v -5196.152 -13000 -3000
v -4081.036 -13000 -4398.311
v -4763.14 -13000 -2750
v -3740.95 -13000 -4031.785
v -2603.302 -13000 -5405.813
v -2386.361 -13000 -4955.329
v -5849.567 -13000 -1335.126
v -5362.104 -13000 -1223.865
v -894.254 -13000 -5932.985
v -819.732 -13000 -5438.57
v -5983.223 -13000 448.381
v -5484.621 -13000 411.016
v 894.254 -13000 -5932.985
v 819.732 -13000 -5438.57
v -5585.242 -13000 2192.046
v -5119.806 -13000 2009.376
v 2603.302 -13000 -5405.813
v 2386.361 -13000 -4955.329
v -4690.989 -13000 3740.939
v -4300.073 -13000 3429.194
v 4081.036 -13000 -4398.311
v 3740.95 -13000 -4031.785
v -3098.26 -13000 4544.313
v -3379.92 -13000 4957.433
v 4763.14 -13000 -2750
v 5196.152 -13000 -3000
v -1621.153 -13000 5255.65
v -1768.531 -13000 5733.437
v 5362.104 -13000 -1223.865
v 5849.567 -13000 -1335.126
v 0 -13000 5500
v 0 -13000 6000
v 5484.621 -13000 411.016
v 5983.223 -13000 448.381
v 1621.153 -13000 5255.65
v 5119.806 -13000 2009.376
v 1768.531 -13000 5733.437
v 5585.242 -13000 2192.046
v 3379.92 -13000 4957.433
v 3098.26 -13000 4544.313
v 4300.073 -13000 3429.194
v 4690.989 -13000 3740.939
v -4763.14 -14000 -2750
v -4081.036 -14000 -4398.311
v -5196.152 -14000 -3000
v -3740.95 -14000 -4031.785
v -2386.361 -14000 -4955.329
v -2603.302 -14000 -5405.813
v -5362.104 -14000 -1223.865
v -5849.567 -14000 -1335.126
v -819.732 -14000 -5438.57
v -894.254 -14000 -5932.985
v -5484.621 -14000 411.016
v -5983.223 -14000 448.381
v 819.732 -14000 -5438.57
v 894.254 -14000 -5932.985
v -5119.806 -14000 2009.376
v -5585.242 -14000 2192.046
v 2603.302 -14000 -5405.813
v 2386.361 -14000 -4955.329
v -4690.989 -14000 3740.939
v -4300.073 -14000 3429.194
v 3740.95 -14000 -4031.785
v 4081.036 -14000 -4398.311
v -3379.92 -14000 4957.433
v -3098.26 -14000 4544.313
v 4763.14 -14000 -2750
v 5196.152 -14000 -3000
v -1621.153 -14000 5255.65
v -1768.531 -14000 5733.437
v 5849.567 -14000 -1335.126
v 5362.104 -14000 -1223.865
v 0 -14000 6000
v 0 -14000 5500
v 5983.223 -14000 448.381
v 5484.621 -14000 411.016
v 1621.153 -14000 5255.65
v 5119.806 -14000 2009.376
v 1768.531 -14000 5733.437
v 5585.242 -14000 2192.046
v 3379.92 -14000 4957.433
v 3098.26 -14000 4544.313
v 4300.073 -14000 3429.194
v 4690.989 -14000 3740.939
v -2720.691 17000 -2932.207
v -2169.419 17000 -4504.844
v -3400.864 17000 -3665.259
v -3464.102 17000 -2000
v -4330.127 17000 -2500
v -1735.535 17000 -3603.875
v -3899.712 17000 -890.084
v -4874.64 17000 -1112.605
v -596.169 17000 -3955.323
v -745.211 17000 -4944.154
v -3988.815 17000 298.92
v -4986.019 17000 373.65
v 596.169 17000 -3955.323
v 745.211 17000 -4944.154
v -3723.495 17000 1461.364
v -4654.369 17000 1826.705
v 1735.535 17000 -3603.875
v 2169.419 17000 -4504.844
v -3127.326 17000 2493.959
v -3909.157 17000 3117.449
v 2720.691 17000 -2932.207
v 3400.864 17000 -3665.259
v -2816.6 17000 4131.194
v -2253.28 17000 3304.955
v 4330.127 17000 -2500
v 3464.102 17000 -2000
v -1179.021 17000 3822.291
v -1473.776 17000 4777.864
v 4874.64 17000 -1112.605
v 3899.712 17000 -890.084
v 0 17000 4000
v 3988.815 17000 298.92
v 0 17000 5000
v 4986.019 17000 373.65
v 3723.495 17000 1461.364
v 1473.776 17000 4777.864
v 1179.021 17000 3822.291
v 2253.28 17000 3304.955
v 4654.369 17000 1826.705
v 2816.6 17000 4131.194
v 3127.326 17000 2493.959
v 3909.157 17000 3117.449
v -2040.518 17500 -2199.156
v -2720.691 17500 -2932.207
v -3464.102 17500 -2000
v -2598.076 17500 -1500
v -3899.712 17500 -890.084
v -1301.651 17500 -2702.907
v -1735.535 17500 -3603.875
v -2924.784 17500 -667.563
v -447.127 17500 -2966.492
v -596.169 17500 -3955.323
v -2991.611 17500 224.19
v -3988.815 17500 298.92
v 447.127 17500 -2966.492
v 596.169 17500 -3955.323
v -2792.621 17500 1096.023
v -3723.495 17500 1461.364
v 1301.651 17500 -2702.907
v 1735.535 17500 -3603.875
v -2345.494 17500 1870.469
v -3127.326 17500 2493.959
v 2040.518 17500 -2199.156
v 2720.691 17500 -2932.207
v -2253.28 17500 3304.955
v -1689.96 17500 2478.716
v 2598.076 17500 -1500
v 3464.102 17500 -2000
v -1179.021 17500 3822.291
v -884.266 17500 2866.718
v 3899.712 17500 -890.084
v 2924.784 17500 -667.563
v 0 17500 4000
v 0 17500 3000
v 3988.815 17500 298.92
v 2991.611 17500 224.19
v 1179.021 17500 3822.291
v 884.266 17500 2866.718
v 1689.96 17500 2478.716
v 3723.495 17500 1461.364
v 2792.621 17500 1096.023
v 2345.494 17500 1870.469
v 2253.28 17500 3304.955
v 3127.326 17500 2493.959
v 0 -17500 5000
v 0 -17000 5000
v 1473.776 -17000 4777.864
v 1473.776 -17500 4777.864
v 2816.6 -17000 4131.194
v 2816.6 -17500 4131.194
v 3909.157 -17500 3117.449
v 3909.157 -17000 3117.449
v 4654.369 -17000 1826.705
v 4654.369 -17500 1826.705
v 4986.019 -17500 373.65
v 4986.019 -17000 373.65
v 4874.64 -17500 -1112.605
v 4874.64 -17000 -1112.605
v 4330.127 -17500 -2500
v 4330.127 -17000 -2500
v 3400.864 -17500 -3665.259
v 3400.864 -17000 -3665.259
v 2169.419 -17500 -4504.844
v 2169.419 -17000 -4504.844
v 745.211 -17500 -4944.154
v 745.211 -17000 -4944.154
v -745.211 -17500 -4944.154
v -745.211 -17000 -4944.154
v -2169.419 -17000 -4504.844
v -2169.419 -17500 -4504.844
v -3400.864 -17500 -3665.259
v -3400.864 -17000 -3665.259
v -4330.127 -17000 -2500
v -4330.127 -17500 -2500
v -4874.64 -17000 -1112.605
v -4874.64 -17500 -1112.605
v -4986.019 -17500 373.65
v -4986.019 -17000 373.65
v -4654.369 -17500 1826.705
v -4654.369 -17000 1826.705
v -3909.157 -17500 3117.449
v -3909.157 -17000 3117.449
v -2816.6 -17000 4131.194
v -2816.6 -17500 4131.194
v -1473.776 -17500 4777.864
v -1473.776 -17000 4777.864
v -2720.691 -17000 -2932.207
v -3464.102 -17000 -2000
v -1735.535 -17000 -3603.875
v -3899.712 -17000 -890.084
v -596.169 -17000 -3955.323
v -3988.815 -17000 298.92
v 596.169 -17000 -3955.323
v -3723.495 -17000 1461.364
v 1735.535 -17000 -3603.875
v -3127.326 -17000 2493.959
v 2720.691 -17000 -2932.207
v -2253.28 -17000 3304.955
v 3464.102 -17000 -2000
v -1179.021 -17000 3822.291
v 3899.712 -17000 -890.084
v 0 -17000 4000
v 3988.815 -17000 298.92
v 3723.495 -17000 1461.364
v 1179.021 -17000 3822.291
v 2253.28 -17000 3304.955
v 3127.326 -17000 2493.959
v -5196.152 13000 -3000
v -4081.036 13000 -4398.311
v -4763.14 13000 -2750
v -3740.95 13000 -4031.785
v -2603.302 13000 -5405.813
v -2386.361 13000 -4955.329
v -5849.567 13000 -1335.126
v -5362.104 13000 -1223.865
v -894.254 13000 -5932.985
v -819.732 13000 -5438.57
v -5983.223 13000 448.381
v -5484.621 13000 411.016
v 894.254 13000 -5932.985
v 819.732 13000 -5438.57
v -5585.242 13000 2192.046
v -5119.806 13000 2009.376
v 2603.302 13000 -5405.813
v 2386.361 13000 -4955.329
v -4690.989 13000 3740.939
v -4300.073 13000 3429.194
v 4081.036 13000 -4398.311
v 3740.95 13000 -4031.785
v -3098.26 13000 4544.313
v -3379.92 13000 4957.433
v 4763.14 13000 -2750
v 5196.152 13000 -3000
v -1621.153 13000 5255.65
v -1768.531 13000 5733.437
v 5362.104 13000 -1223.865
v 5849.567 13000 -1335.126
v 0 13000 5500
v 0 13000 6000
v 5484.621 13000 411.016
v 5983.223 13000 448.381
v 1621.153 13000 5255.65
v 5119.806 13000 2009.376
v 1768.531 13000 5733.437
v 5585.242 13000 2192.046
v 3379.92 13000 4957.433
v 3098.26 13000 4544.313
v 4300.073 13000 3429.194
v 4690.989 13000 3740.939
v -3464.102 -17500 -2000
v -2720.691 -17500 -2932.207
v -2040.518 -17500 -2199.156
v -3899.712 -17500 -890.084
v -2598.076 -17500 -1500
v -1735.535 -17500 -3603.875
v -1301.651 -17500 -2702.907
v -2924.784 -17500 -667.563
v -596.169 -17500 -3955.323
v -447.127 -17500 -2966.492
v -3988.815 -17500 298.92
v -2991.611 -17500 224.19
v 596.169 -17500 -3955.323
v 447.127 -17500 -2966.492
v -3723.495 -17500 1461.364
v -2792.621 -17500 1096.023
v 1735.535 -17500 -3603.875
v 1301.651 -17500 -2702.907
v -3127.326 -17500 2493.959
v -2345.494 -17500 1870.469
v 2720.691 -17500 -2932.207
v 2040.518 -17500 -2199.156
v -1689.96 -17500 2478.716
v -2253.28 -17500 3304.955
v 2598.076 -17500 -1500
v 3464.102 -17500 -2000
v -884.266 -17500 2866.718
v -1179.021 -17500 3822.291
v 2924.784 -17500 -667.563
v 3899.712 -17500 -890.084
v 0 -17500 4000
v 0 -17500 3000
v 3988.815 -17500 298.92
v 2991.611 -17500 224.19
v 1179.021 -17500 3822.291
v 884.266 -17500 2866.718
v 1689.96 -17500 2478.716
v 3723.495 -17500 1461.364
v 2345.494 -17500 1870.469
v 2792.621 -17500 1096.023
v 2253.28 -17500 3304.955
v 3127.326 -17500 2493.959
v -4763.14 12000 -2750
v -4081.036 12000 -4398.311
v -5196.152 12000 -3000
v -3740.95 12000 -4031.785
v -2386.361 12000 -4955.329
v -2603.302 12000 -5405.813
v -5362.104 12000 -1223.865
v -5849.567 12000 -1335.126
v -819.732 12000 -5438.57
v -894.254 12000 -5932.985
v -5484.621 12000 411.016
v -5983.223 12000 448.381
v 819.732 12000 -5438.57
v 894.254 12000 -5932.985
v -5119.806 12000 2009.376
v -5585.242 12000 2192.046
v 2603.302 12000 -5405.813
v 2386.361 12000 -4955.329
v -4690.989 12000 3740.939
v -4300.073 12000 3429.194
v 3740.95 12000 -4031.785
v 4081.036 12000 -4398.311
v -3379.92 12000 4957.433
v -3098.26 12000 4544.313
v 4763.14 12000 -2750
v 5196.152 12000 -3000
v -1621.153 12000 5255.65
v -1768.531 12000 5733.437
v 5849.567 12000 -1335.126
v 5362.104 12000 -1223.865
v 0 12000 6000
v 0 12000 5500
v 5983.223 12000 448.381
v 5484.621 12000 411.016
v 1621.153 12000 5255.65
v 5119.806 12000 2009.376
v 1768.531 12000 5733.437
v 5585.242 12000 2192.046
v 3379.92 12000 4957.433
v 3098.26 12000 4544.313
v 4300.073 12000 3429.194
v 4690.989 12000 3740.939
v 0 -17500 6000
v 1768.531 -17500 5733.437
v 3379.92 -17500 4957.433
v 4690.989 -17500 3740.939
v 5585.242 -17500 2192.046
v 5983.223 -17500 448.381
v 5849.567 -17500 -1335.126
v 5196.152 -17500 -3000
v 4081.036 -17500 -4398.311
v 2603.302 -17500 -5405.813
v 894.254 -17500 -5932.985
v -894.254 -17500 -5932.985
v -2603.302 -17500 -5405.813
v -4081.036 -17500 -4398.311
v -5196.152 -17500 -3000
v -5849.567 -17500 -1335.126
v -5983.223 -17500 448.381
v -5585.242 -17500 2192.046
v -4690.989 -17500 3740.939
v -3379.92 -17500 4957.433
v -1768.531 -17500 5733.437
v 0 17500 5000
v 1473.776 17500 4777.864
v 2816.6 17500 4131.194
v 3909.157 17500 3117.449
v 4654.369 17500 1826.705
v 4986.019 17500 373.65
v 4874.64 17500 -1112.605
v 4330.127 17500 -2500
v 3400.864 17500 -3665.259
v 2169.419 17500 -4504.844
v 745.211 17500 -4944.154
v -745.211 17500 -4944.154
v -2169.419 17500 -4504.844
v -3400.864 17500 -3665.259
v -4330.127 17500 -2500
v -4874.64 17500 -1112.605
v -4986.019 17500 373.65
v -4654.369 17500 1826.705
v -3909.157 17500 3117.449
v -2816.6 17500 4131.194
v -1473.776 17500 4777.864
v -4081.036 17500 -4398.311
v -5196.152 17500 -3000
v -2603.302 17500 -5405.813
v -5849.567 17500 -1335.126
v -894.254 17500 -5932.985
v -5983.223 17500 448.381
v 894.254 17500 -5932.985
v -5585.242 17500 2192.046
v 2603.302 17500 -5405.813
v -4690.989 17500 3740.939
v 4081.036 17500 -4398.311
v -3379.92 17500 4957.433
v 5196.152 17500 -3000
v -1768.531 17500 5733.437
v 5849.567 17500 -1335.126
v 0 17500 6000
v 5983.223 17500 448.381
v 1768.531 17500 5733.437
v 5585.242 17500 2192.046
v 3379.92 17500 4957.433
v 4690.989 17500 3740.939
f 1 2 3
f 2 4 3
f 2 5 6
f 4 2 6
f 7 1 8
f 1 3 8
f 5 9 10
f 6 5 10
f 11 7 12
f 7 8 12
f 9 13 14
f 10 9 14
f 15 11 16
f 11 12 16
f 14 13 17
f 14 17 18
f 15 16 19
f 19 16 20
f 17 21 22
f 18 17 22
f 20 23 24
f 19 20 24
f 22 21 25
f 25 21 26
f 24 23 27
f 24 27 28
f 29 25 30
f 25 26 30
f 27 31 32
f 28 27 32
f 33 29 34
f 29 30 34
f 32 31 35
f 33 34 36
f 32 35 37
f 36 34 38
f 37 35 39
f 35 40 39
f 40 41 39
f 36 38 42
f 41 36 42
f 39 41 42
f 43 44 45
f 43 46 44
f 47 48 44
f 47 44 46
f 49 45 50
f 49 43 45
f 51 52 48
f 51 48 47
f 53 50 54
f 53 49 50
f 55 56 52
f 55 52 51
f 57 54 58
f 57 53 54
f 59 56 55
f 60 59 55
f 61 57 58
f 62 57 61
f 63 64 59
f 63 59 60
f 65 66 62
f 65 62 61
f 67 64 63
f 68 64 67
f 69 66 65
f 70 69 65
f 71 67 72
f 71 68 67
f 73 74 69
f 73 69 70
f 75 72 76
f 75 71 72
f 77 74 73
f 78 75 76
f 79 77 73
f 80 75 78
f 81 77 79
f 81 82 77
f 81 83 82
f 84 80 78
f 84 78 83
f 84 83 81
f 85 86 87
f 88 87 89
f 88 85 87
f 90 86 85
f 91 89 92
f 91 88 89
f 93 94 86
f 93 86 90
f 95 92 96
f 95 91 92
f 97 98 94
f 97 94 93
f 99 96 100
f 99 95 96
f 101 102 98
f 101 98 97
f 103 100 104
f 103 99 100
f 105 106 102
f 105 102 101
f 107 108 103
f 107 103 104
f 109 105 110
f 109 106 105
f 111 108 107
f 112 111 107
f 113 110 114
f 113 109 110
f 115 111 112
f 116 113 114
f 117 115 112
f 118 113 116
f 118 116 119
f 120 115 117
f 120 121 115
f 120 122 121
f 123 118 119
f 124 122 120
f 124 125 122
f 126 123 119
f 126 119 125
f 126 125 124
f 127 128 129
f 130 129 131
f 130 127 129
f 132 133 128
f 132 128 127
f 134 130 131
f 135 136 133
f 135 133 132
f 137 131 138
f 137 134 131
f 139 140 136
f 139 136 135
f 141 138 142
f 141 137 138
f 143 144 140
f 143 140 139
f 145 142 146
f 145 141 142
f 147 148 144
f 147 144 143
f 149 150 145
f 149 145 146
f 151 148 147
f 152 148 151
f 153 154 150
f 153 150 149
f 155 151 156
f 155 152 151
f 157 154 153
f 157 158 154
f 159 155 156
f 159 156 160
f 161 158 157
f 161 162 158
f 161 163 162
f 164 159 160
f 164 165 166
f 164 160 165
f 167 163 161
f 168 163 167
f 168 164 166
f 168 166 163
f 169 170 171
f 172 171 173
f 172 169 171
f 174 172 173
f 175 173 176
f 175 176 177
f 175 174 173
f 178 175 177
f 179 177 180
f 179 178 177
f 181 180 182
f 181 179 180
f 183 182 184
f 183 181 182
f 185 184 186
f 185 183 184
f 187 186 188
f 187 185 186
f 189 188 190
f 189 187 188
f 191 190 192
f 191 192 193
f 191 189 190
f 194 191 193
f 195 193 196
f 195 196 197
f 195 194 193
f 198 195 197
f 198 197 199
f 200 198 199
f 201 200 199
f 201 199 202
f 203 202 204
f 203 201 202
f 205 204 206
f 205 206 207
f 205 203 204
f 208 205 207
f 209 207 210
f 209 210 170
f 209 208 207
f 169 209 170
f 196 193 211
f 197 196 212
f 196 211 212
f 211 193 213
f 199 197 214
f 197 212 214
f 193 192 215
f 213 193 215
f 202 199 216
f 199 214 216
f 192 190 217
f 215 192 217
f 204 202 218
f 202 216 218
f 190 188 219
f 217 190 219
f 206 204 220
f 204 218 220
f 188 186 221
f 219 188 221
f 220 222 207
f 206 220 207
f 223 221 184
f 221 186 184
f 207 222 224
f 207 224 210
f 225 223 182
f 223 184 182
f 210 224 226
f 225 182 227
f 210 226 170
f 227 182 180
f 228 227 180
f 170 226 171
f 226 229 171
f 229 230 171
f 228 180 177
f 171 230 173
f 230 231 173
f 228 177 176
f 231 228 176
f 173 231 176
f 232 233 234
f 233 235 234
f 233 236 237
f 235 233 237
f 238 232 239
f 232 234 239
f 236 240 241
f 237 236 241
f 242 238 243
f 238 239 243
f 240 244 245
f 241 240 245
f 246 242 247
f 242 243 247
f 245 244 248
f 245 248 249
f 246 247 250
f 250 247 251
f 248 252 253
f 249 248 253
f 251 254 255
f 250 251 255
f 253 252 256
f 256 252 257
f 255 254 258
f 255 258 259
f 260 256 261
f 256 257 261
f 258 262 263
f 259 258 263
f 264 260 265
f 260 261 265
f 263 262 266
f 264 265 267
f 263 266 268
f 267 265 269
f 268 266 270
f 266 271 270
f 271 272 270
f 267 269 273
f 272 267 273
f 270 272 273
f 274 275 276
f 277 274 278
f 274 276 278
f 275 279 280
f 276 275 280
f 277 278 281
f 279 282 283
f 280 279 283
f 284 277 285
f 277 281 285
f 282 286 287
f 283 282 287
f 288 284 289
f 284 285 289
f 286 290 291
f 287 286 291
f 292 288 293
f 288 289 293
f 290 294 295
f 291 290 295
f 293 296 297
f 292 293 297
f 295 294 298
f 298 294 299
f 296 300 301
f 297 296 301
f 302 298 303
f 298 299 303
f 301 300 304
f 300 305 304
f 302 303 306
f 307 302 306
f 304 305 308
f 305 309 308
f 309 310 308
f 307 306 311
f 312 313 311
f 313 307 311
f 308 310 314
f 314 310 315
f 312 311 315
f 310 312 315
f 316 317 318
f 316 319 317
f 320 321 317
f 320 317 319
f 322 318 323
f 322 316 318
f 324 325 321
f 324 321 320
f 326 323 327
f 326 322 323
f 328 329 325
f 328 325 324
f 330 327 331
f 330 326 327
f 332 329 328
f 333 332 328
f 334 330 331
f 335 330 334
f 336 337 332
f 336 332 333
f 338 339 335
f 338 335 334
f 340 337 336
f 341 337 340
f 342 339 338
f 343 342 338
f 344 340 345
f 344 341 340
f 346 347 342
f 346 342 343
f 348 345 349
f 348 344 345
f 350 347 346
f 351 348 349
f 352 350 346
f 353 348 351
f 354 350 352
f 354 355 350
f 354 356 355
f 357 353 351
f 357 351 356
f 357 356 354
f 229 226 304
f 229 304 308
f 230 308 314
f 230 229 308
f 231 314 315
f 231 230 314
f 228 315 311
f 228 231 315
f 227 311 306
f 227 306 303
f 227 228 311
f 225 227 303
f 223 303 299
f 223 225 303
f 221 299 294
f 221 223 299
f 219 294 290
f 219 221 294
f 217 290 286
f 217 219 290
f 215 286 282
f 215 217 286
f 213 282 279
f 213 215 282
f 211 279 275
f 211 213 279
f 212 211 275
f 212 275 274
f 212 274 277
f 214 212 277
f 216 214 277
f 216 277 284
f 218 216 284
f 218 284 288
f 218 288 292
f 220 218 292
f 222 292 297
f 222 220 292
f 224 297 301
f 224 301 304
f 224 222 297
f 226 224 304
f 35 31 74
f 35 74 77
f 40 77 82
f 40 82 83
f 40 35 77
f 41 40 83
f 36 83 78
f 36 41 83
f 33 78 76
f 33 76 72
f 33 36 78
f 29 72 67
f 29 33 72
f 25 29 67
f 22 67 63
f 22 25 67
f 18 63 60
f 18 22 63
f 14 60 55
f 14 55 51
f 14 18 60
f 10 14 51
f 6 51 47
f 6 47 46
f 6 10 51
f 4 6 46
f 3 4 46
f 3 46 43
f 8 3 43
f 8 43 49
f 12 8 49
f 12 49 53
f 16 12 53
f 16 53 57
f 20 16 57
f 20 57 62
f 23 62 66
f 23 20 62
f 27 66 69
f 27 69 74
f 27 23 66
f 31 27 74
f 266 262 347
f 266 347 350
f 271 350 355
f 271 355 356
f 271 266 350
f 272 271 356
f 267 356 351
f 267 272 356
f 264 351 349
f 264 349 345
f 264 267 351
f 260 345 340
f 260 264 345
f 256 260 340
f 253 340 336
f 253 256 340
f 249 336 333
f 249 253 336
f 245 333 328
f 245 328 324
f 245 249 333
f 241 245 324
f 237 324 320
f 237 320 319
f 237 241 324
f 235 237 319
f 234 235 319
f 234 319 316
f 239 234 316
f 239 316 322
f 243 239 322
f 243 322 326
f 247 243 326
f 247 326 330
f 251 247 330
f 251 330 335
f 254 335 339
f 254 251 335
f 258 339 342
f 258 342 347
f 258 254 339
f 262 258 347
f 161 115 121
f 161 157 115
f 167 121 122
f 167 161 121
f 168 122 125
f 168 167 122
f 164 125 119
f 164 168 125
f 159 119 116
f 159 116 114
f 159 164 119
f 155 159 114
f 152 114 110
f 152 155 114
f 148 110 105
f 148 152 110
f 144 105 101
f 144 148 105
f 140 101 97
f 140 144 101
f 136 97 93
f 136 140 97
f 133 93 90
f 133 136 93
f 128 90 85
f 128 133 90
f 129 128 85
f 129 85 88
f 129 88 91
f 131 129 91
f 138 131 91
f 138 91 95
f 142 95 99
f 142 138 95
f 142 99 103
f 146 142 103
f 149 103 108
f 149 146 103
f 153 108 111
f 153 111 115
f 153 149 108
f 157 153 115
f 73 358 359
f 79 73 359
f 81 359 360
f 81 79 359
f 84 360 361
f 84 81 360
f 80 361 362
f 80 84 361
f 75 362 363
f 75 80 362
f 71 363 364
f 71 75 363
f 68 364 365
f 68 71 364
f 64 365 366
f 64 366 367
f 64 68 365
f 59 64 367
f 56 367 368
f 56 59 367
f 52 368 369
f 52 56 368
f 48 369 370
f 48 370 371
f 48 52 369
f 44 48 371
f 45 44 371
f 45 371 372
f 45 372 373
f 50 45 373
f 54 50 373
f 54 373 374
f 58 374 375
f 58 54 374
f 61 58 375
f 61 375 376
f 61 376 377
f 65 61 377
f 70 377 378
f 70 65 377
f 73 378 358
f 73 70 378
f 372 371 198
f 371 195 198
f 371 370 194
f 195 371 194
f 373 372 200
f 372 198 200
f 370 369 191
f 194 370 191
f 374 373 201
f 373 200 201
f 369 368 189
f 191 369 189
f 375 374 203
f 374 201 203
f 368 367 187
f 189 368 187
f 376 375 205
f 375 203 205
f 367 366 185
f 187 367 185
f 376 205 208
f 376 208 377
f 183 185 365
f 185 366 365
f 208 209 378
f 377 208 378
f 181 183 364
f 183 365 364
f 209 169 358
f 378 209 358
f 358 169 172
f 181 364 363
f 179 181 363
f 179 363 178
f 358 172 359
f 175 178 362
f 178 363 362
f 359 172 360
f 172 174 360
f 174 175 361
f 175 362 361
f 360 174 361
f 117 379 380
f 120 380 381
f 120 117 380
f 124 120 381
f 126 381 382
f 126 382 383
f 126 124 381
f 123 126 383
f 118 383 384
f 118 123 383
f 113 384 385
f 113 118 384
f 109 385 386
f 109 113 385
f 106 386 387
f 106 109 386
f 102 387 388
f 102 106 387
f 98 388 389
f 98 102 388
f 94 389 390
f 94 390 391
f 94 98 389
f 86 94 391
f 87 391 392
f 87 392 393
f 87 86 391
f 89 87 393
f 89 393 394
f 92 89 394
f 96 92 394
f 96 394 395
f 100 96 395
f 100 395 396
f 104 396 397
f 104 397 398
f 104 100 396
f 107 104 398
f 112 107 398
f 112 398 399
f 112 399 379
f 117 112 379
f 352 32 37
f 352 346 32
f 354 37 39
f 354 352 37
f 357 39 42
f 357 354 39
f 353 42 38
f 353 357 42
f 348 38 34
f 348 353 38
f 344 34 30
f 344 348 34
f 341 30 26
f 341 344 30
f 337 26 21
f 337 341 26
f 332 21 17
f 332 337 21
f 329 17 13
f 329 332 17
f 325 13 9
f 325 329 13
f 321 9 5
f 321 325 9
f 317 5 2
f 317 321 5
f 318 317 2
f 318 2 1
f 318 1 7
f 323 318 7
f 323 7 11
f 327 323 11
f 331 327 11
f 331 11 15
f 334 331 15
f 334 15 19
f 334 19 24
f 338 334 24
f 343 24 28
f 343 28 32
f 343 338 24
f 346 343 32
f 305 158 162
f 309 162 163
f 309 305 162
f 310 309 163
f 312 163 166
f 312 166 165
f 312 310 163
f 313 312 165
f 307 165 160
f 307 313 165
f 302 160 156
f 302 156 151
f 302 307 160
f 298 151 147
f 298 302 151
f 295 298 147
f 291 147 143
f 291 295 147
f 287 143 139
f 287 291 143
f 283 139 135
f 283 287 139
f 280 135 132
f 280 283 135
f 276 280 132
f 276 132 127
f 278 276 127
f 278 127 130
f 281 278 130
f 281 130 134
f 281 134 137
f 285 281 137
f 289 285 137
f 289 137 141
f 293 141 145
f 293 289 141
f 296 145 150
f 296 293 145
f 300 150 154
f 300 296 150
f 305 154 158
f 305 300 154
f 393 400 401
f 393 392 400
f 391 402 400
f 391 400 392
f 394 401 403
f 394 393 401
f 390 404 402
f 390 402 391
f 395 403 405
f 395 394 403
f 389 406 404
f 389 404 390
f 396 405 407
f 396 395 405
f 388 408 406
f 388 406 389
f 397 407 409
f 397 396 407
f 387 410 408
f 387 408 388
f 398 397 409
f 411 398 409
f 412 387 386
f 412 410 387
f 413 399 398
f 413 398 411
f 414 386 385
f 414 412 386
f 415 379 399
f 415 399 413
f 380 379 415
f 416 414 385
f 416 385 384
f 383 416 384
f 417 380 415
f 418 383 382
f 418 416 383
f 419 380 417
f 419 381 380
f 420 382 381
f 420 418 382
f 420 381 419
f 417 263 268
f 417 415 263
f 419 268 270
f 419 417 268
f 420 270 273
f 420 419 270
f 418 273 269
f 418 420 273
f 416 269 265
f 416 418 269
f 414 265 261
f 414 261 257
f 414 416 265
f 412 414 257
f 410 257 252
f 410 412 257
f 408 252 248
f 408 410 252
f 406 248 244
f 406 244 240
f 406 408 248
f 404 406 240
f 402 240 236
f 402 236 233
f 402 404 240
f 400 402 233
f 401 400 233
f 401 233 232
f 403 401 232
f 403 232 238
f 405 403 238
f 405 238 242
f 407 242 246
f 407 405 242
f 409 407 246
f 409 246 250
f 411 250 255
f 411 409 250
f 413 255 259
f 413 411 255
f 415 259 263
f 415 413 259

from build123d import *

# Parameters (mm, degrees)
SKETCH_1_R          = 6000
SKETCH_1_R_2        = 5000
EXTRUDE_1_DEPTH     = 17500
SKETCH_1_5_R        = 4000
SKETCH_1_5_R_2      = 3000
EXTRUDE_3_DEPTH     = 17500
SKETCH_1_6_R        = 5000
SKETCH_1_6_R_2      = 4000
EXTRUDE_4_DEPTH     = 17000
SKETCH_5_R          = 6000
SKETCH_5_R_2        = 5500
CUT_EXTRUDE_4_DEPTH = 1000
SKETCH_6_R          = 6000
SKETCH_6_R_2        = 5500
CUT_EXTRUDE_5_DEPTH = 1000


with BuildPart() as part:
    # 草圖1 → 填料-伸長1 (new, symmetric)
    with BuildSketch(Plane(origin=(0, 0, 0), x_dir=(1, 0, 0), z_dir=(0, 1, 0))):
        Circle(SKETCH_1_R)
        Circle(SKETCH_1_R_2, mode=Mode.SUBTRACT)
    extrude(amount=EXTRUDE_1_DEPTH, both=True)



with BuildPart() as body_2:
    # 草圖1<5> → 填料-伸長3 (new, symmetric)
    with BuildSketch(Plane(origin=(0, 0, 0), x_dir=(1, 0, 0), z_dir=(0, 1, 0))):
        Circle(SKETCH_1_5_R)
        Circle(SKETCH_1_5_R_2, mode=Mode.SUBTRACT)
    extrude(amount=EXTRUDE_3_DEPTH, both=True)


with BuildPart() as part_1:
    add(part.part)

    add(body_2.part)  # 填料-伸長4 merges body 2
    # 草圖1<6> → 填料-伸長4 (add, symmetric)
    with BuildSketch(Plane(origin=(0, 0, 0), x_dir=(1, 0, 0), z_dir=(0, 1, 0))):
        Circle(SKETCH_1_6_R)
        Circle(SKETCH_1_6_R_2, mode=Mode.SUBTRACT)
    extrude(amount=EXTRUDE_4_DEPTH, both=True)

    # 草圖5 → 除料-伸長4 (cut)
    with BuildSketch(Plane(origin=(0, 13000, 0), x_dir=(1, 0, 0), z_dir=(0, 1, 0))):
        Circle(SKETCH_5_R)
        Circle(SKETCH_5_R_2, mode=Mode.SUBTRACT)
    extrude(amount=-CUT_EXTRUDE_4_DEPTH, mode=Mode.SUBTRACT)

    # 草圖6 → 除料-伸長5 (cut)
    with BuildSketch(Plane(origin=(0, -13000, 0), x_dir=(1, 0, 0), z_dir=(0, 1, 0))):
        Circle(SKETCH_6_R)
        Circle(SKETCH_6_R_2, mode=Mode.SUBTRACT)
    extrude(amount=-CUT_EXTRUDE_5_DEPTH, mode=Mode.SUBTRACT)


solid = part_1.part
